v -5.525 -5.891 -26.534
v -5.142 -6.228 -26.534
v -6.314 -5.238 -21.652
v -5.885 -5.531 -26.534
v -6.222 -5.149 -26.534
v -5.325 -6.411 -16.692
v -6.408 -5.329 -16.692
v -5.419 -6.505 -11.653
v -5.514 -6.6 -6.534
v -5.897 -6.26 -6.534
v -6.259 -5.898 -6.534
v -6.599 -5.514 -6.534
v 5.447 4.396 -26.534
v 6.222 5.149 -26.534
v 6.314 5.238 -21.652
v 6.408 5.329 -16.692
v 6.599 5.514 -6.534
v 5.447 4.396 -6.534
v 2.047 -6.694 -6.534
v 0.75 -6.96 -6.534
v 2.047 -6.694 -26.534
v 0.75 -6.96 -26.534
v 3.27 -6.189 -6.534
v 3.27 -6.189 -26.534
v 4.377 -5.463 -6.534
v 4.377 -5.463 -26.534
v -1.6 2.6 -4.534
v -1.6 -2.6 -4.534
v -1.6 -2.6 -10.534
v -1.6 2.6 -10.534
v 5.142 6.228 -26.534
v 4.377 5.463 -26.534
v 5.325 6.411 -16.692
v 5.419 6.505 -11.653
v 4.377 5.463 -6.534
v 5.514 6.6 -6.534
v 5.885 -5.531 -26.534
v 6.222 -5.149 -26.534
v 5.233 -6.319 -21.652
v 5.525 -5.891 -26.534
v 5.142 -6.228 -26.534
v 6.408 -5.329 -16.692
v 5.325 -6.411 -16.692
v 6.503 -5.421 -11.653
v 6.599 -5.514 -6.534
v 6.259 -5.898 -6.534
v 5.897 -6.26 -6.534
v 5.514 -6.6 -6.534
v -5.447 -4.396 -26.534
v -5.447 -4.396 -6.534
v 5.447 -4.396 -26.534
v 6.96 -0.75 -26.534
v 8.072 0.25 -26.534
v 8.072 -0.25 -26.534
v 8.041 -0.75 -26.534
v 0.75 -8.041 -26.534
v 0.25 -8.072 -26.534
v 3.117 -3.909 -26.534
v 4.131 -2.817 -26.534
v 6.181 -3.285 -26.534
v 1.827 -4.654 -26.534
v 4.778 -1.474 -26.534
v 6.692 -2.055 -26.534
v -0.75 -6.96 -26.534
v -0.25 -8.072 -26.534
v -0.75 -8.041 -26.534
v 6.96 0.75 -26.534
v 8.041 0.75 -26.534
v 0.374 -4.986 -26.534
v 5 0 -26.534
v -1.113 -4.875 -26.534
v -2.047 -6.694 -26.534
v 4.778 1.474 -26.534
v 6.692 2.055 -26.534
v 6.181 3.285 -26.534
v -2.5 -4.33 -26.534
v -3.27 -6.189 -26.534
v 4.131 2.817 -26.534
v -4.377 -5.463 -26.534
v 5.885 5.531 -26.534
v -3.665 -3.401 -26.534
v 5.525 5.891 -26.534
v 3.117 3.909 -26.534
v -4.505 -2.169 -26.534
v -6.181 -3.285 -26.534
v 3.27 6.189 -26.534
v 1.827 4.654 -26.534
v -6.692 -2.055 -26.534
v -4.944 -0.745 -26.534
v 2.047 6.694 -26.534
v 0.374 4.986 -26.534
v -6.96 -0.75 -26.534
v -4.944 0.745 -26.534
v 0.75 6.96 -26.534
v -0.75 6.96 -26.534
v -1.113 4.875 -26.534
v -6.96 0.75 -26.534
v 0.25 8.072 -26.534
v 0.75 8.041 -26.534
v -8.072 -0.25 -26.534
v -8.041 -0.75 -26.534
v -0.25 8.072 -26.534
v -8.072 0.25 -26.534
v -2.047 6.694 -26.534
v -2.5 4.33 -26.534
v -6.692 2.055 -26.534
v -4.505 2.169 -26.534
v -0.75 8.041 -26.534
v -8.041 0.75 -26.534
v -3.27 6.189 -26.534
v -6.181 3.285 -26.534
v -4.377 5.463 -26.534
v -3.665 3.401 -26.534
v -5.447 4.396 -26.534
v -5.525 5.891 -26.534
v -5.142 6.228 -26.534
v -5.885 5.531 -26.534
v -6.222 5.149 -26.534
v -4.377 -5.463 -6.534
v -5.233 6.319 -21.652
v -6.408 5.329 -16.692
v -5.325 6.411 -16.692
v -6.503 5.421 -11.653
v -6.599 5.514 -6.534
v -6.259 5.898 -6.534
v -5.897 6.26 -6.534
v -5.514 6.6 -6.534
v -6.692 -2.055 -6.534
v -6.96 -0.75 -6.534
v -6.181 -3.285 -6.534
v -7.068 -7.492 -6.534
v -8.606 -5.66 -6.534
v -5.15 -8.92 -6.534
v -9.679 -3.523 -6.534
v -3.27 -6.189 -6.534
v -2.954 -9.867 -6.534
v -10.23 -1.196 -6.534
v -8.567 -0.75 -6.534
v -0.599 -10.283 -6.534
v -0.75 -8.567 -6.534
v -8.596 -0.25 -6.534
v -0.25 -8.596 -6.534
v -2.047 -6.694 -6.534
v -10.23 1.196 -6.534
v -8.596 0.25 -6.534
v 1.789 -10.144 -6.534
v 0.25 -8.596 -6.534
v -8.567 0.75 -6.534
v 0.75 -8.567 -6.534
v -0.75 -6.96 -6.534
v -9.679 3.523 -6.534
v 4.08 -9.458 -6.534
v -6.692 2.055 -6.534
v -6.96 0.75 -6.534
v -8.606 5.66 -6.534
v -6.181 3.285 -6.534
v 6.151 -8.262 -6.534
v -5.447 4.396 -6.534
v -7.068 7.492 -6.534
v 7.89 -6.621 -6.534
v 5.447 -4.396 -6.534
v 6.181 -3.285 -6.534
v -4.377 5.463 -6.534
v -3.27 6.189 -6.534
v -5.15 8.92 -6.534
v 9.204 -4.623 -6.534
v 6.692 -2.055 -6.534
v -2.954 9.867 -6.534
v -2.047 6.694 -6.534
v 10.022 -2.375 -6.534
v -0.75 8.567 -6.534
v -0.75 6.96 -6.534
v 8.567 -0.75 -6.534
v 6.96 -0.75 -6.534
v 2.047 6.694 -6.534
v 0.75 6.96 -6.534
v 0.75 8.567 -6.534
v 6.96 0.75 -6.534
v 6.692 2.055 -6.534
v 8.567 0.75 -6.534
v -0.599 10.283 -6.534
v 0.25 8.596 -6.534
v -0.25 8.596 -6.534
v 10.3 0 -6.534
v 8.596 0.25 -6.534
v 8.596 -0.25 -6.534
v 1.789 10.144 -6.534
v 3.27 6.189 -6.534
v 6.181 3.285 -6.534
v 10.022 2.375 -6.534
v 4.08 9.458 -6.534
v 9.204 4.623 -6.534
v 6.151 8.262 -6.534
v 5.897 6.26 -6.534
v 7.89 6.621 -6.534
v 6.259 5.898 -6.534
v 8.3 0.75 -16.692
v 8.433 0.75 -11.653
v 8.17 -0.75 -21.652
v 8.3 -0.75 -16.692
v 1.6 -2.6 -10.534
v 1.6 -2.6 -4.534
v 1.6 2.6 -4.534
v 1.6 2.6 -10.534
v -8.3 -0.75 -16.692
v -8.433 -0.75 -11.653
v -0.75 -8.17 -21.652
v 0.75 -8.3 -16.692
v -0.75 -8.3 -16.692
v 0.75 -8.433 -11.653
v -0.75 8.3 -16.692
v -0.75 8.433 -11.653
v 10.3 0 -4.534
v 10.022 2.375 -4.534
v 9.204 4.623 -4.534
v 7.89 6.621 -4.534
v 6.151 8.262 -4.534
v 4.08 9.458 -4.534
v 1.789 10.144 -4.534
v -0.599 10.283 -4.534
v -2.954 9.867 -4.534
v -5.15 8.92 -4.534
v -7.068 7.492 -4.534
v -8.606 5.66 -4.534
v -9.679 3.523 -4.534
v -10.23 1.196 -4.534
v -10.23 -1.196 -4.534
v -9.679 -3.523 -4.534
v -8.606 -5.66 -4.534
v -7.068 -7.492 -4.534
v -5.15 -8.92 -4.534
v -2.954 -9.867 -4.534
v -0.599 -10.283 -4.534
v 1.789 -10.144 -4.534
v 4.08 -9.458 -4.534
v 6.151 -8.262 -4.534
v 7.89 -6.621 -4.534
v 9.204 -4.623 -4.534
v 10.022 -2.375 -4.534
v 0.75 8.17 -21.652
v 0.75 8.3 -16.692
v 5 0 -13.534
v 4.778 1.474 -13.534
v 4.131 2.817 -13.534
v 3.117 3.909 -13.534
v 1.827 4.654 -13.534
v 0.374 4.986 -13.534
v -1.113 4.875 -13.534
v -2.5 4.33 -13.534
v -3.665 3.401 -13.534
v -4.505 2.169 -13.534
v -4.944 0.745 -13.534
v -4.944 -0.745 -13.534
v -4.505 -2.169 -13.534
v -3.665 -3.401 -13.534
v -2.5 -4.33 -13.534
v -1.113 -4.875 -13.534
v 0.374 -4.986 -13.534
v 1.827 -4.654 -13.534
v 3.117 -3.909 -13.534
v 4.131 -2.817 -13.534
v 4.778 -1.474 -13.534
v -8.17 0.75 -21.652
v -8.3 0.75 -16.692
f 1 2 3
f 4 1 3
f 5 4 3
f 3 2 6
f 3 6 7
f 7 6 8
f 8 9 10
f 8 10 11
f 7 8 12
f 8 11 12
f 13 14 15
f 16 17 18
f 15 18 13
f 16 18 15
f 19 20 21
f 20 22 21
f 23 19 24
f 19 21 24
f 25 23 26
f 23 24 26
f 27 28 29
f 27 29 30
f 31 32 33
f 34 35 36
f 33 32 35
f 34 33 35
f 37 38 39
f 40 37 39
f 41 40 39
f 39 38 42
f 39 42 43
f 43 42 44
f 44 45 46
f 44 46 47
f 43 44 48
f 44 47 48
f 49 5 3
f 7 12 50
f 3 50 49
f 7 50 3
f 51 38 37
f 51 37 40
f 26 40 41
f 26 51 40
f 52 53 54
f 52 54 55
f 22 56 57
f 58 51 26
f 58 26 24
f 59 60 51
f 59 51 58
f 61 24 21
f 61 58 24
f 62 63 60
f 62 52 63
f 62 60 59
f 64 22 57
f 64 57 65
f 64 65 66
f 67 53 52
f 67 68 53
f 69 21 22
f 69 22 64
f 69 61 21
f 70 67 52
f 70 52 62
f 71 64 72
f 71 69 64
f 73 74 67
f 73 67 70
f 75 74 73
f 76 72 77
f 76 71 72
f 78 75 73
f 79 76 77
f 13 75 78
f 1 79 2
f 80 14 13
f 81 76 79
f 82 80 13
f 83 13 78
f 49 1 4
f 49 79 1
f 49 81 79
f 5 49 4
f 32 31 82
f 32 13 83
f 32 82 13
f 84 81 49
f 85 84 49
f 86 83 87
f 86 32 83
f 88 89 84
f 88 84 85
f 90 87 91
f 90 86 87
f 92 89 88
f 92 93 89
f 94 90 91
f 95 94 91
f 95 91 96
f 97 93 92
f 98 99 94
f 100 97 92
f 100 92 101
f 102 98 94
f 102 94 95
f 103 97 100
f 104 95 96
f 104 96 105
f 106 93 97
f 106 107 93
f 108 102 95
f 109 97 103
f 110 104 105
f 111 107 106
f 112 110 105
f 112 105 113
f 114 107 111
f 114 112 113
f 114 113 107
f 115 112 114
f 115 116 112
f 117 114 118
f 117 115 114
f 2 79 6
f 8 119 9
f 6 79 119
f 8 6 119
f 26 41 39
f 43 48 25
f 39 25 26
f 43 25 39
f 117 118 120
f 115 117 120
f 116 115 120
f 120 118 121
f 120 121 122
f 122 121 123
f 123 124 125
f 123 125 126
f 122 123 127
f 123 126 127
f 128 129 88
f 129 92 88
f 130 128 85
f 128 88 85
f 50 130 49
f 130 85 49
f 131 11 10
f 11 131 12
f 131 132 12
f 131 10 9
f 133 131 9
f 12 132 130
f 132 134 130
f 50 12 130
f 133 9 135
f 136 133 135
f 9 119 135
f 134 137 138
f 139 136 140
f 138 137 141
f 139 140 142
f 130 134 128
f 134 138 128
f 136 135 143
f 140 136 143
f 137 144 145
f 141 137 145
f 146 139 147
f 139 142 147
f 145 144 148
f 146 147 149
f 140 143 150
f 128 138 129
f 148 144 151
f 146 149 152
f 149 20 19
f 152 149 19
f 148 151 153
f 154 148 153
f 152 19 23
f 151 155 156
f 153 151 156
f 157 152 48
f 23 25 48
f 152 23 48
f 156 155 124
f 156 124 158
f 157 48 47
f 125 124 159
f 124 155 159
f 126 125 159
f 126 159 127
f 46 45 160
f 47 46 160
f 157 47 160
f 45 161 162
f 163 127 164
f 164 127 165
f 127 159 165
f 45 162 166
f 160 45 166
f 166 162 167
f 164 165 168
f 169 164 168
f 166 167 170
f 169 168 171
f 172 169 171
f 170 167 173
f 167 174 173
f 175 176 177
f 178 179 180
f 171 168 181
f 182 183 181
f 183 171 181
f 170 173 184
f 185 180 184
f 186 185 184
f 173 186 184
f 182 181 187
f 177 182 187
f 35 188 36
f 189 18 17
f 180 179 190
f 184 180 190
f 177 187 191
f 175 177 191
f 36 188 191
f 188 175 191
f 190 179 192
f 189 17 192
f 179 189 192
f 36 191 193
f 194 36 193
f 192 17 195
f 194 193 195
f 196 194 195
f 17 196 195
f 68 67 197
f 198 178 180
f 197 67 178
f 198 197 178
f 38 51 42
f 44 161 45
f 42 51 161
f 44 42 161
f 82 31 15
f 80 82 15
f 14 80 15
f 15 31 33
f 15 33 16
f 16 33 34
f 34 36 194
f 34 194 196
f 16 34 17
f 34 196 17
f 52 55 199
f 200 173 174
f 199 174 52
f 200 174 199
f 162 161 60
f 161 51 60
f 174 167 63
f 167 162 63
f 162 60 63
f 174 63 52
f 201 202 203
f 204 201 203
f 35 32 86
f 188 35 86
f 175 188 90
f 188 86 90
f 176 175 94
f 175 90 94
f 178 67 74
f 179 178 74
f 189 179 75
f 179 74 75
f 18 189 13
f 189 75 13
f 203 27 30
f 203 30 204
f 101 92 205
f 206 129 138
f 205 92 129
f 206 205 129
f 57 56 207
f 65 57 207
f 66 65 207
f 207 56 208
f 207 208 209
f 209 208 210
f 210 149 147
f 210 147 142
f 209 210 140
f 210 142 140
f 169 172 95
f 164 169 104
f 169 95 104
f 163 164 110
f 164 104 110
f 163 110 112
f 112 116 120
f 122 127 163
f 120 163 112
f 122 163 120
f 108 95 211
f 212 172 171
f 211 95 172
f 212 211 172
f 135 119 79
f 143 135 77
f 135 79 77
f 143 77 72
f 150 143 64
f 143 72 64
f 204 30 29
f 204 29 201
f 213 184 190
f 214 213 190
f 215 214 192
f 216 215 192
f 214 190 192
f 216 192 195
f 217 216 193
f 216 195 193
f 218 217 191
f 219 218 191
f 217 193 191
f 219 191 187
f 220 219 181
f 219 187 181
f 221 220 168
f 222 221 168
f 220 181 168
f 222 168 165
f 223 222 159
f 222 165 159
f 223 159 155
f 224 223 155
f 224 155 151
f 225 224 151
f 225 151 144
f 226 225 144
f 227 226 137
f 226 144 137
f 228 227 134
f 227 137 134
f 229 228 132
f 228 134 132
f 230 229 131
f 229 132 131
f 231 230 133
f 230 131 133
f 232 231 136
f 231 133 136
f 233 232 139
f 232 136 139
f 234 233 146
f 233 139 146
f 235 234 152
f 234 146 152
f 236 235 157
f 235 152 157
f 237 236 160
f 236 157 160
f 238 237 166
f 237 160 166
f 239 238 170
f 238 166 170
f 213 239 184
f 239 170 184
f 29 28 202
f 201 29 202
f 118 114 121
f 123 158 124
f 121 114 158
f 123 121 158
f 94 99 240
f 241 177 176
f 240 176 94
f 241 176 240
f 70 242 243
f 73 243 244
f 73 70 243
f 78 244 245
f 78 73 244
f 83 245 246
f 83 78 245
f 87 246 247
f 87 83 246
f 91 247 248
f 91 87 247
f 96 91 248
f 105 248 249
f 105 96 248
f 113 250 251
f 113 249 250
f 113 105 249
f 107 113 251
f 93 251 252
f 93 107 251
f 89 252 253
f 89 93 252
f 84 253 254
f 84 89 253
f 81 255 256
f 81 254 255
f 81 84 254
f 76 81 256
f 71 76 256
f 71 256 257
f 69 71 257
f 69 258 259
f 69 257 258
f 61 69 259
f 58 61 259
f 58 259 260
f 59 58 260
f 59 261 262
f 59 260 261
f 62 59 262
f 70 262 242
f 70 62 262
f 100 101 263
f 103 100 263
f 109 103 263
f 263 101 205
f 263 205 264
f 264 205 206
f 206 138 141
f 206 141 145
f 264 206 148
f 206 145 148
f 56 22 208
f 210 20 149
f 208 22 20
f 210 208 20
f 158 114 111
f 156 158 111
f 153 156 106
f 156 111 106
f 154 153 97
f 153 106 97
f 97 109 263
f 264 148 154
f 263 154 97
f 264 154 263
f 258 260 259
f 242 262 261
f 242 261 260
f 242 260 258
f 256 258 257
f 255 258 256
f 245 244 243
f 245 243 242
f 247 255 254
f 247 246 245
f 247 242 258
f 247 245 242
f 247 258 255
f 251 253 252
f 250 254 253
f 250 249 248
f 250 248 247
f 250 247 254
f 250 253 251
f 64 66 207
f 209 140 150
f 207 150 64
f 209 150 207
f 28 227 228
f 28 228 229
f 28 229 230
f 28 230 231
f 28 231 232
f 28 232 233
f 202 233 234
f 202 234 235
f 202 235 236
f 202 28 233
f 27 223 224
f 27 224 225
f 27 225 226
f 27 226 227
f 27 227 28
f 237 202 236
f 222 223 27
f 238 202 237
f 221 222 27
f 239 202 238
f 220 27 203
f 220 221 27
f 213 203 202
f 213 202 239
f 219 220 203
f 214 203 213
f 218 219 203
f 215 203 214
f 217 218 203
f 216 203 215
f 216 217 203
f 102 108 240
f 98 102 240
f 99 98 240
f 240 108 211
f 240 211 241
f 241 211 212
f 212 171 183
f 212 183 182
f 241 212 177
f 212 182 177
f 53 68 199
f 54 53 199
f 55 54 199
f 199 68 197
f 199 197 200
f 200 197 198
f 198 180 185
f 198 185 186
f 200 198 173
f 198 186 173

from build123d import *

# Parameters (mm, degrees)
SKETCH_1_R           = 20.6
EXTRUDE_1_DEPTH      = 4
EXTRUDE_2_DEPTH      = 1
EXTRUDE_2_DEPTH_BACK = 40
SKETCH_2_R           = 14
SKETCH_2_R_2         = 10
EXTRUDE_3_DEPTH      = 40
SKETCH_9_R           = 14
EXTRUDE_4_DEPTH      = 14
SKETCH_10_W          = 6.4
SKETCH_10_H          = 10.4
CUT_EXTRUDE_1_DEPTH  = 12
SCALE_1_SCALE        = 0.5


with BuildPart() as part:
    # Эскиз1 → Бобышка-Вытянуть1 (new body)
    with BuildSketch(Plane.XY):
        Circle(SKETCH_1_R)
    extrude(amount=EXTRUDE_1_DEPTH)



with BuildPart() as body_2:
    # Эскиз2 → Бобышка-Вытянуть2 (new, two sides: drawn at the far end of the back side and taken through both)
    with BuildSketch(Plane.XY.offset(-EXTRUDE_2_DEPTH_BACK)):
        Circle(SKETCH_2_R)
        Circle(SKETCH_2_R_2, mode=Mode.SUBTRACT)
    extrude(amount=EXTRUDE_2_DEPTH + EXTRUDE_2_DEPTH_BACK)


with BuildPart() as part_1:
    add(part.part)

    add(body_2.part)  # Бобышка-Вытянуть3 merges body 2
    # Эскиз3 → Бобышка-Вытянуть3 (add)
    with BuildSketch(Plane(origin=(0, 0, 0), x_dir=(-1, 0, 0), z_dir=(0, 0, -1))):
        with BuildLine():
            Line((-13.919410907, 1.5), (-17.134468186, 1.5))
            ThreePointArc((-17.134468186, 1.5), (-17.2, 0), (-17.134468186, -1.5))
            Line((-17.134468186, -1.5), (-13.919410907, -1.5))
            ThreePointArc((-13.919410907, -1.5), (-14, 0), (-13.919410907, 1.5))
        make_face()
        with BuildLine():
            Line((-13.198589674, 11.028926993), (-10.894370922, 8.792763059))
            ThreePointArc((-10.894370922, 8.792763059), (-9.881821028, 9.917137347), (-8.753841642, 10.925669613))
            Line((-8.753841642, 10.925669613), (-11.027747345, 13.199575315))
            ThreePointArc((-11.027747345, 13.199575315), (-12.161693133, 12.162780115), (-13.198589674, 11.028926993))
        make_face()
        with BuildLine():
            ThreePointArc((-8.753841642, -10.925669613), (-9.881821028, -9.917137347), (-10.894370922, -8.792763059))
            Line((-10.894370922, -8.792763059), (-13.198589674, -11.028926993))
            ThreePointArc((-13.198589674, -11.028926993), (-12.161693133, -12.162780115), (-11.027747345, -13.199575315))
            Line((-11.027747345, -13.199575315), (-8.753841642, -10.925669613))
        make_face()
        with BuildLine():
            Line((-1.5, 17.134468186), (-1.5, 13.919410907))
            ThreePointArc((-1.5, 13.919410907), (0, 14), (1.5, 13.919410907))
            Line((1.5, 13.919410907), (1.5, 17.134468186))
            ThreePointArc((1.5, 17.134468186), (0, 17.2), (-1.5, 17.134468186))
        make_face()
        with BuildLine():
            ThreePointArc((1.5, -13.919410907), (0, -14), (-1.5, -13.919410907))
            Line((-1.5, -13.919410907), (-1.5, -17.134468186))
            ThreePointArc((-1.5, -17.134468186), (0, -17.2), (1.5, -17.134468186))
            Line((1.5, -17.134468186), (1.5, -13.919410907))
        make_face()
        with BuildLine():
            Line((11.027747345, 13.199575315), (8.753841642, 10.925669613))
            ThreePointArc((8.753841642, 10.925669613), (9.881821028, 9.917137347), (10.894370922, 8.792763059))
            Line((10.894370922, 8.792763059), (13.198589674, 11.028926993))
            ThreePointArc((13.198589674, 11.028926993), (12.161693133, 12.162780115), (11.027747345, 13.199575315))
        make_face()
        with BuildLine():
            ThreePointArc((10.894370922, -8.792763059), (9.881821028, -9.917137347), (8.753841642, -10.925669613))
            Line((8.753841642, -10.925669613), (11.027747345, -13.199575315))
            ThreePointArc((11.027747345, -13.199575315), (12.161693133, -12.162780115), (13.198589674, -11.028926993))
            Line((13.198589674, -11.028926993), (10.894370922, -8.792763059))
        make_face()
        with BuildLine():
            Line((17.134468186, 1.5), (13.919410907, 1.5))
            ThreePointArc((13.919410907, 1.5), (14, 0), (13.919410907, -1.5))
            Line((13.919410907, -1.5), (17.134468186, -1.5))
            ThreePointArc((17.134468186, -1.5), (17.2, 0), (17.134468186, 1.5))
        make_face()
    extrude(amount=EXTRUDE_3_DEPTH)

    # Эскиз8 → Вырез-Повернуть2 (revolve, cut)
    with BuildSketch(Plane(origin=(0, 0, 0), x_dir=(0, 0, -1), z_dir=(1, 0, 0))):
        Polygon((40, 16.152563137), (0, 17.2), (40, 17.2), align=None)
    revolve(axis=Axis((0, 0, 0), (0, 0, -1)), mode=Mode.SUBTRACT)

    # Эскиз9 → Бобышка-Вытянуть4 (add)
    with BuildSketch(Plane(origin=(0, 0, 0), x_dir=(-1, 0, 0), z_dir=(0, 0, -1))):
        Circle(SKETCH_9_R)
    extrude(amount=EXTRUDE_4_DEPTH)

    # Эскиз10 → Вырез-Вытянуть1 (cut)
    with BuildSketch(Plane.XY.offset(4)):
        Rectangle(SKETCH_10_W, SKETCH_10_H)
    extrude(amount=-CUT_EXTRUDE_1_DEPTH, mode=Mode.SUBTRACT)


with BuildPart() as part_2:
    # Масштаб1: scaled about (0, 0, -13.067917949)
    add(part_1.part.scale(SCALE_1_SCALE).moved(Location((0, 0, -6.533958974))))


solid = part_2.part
